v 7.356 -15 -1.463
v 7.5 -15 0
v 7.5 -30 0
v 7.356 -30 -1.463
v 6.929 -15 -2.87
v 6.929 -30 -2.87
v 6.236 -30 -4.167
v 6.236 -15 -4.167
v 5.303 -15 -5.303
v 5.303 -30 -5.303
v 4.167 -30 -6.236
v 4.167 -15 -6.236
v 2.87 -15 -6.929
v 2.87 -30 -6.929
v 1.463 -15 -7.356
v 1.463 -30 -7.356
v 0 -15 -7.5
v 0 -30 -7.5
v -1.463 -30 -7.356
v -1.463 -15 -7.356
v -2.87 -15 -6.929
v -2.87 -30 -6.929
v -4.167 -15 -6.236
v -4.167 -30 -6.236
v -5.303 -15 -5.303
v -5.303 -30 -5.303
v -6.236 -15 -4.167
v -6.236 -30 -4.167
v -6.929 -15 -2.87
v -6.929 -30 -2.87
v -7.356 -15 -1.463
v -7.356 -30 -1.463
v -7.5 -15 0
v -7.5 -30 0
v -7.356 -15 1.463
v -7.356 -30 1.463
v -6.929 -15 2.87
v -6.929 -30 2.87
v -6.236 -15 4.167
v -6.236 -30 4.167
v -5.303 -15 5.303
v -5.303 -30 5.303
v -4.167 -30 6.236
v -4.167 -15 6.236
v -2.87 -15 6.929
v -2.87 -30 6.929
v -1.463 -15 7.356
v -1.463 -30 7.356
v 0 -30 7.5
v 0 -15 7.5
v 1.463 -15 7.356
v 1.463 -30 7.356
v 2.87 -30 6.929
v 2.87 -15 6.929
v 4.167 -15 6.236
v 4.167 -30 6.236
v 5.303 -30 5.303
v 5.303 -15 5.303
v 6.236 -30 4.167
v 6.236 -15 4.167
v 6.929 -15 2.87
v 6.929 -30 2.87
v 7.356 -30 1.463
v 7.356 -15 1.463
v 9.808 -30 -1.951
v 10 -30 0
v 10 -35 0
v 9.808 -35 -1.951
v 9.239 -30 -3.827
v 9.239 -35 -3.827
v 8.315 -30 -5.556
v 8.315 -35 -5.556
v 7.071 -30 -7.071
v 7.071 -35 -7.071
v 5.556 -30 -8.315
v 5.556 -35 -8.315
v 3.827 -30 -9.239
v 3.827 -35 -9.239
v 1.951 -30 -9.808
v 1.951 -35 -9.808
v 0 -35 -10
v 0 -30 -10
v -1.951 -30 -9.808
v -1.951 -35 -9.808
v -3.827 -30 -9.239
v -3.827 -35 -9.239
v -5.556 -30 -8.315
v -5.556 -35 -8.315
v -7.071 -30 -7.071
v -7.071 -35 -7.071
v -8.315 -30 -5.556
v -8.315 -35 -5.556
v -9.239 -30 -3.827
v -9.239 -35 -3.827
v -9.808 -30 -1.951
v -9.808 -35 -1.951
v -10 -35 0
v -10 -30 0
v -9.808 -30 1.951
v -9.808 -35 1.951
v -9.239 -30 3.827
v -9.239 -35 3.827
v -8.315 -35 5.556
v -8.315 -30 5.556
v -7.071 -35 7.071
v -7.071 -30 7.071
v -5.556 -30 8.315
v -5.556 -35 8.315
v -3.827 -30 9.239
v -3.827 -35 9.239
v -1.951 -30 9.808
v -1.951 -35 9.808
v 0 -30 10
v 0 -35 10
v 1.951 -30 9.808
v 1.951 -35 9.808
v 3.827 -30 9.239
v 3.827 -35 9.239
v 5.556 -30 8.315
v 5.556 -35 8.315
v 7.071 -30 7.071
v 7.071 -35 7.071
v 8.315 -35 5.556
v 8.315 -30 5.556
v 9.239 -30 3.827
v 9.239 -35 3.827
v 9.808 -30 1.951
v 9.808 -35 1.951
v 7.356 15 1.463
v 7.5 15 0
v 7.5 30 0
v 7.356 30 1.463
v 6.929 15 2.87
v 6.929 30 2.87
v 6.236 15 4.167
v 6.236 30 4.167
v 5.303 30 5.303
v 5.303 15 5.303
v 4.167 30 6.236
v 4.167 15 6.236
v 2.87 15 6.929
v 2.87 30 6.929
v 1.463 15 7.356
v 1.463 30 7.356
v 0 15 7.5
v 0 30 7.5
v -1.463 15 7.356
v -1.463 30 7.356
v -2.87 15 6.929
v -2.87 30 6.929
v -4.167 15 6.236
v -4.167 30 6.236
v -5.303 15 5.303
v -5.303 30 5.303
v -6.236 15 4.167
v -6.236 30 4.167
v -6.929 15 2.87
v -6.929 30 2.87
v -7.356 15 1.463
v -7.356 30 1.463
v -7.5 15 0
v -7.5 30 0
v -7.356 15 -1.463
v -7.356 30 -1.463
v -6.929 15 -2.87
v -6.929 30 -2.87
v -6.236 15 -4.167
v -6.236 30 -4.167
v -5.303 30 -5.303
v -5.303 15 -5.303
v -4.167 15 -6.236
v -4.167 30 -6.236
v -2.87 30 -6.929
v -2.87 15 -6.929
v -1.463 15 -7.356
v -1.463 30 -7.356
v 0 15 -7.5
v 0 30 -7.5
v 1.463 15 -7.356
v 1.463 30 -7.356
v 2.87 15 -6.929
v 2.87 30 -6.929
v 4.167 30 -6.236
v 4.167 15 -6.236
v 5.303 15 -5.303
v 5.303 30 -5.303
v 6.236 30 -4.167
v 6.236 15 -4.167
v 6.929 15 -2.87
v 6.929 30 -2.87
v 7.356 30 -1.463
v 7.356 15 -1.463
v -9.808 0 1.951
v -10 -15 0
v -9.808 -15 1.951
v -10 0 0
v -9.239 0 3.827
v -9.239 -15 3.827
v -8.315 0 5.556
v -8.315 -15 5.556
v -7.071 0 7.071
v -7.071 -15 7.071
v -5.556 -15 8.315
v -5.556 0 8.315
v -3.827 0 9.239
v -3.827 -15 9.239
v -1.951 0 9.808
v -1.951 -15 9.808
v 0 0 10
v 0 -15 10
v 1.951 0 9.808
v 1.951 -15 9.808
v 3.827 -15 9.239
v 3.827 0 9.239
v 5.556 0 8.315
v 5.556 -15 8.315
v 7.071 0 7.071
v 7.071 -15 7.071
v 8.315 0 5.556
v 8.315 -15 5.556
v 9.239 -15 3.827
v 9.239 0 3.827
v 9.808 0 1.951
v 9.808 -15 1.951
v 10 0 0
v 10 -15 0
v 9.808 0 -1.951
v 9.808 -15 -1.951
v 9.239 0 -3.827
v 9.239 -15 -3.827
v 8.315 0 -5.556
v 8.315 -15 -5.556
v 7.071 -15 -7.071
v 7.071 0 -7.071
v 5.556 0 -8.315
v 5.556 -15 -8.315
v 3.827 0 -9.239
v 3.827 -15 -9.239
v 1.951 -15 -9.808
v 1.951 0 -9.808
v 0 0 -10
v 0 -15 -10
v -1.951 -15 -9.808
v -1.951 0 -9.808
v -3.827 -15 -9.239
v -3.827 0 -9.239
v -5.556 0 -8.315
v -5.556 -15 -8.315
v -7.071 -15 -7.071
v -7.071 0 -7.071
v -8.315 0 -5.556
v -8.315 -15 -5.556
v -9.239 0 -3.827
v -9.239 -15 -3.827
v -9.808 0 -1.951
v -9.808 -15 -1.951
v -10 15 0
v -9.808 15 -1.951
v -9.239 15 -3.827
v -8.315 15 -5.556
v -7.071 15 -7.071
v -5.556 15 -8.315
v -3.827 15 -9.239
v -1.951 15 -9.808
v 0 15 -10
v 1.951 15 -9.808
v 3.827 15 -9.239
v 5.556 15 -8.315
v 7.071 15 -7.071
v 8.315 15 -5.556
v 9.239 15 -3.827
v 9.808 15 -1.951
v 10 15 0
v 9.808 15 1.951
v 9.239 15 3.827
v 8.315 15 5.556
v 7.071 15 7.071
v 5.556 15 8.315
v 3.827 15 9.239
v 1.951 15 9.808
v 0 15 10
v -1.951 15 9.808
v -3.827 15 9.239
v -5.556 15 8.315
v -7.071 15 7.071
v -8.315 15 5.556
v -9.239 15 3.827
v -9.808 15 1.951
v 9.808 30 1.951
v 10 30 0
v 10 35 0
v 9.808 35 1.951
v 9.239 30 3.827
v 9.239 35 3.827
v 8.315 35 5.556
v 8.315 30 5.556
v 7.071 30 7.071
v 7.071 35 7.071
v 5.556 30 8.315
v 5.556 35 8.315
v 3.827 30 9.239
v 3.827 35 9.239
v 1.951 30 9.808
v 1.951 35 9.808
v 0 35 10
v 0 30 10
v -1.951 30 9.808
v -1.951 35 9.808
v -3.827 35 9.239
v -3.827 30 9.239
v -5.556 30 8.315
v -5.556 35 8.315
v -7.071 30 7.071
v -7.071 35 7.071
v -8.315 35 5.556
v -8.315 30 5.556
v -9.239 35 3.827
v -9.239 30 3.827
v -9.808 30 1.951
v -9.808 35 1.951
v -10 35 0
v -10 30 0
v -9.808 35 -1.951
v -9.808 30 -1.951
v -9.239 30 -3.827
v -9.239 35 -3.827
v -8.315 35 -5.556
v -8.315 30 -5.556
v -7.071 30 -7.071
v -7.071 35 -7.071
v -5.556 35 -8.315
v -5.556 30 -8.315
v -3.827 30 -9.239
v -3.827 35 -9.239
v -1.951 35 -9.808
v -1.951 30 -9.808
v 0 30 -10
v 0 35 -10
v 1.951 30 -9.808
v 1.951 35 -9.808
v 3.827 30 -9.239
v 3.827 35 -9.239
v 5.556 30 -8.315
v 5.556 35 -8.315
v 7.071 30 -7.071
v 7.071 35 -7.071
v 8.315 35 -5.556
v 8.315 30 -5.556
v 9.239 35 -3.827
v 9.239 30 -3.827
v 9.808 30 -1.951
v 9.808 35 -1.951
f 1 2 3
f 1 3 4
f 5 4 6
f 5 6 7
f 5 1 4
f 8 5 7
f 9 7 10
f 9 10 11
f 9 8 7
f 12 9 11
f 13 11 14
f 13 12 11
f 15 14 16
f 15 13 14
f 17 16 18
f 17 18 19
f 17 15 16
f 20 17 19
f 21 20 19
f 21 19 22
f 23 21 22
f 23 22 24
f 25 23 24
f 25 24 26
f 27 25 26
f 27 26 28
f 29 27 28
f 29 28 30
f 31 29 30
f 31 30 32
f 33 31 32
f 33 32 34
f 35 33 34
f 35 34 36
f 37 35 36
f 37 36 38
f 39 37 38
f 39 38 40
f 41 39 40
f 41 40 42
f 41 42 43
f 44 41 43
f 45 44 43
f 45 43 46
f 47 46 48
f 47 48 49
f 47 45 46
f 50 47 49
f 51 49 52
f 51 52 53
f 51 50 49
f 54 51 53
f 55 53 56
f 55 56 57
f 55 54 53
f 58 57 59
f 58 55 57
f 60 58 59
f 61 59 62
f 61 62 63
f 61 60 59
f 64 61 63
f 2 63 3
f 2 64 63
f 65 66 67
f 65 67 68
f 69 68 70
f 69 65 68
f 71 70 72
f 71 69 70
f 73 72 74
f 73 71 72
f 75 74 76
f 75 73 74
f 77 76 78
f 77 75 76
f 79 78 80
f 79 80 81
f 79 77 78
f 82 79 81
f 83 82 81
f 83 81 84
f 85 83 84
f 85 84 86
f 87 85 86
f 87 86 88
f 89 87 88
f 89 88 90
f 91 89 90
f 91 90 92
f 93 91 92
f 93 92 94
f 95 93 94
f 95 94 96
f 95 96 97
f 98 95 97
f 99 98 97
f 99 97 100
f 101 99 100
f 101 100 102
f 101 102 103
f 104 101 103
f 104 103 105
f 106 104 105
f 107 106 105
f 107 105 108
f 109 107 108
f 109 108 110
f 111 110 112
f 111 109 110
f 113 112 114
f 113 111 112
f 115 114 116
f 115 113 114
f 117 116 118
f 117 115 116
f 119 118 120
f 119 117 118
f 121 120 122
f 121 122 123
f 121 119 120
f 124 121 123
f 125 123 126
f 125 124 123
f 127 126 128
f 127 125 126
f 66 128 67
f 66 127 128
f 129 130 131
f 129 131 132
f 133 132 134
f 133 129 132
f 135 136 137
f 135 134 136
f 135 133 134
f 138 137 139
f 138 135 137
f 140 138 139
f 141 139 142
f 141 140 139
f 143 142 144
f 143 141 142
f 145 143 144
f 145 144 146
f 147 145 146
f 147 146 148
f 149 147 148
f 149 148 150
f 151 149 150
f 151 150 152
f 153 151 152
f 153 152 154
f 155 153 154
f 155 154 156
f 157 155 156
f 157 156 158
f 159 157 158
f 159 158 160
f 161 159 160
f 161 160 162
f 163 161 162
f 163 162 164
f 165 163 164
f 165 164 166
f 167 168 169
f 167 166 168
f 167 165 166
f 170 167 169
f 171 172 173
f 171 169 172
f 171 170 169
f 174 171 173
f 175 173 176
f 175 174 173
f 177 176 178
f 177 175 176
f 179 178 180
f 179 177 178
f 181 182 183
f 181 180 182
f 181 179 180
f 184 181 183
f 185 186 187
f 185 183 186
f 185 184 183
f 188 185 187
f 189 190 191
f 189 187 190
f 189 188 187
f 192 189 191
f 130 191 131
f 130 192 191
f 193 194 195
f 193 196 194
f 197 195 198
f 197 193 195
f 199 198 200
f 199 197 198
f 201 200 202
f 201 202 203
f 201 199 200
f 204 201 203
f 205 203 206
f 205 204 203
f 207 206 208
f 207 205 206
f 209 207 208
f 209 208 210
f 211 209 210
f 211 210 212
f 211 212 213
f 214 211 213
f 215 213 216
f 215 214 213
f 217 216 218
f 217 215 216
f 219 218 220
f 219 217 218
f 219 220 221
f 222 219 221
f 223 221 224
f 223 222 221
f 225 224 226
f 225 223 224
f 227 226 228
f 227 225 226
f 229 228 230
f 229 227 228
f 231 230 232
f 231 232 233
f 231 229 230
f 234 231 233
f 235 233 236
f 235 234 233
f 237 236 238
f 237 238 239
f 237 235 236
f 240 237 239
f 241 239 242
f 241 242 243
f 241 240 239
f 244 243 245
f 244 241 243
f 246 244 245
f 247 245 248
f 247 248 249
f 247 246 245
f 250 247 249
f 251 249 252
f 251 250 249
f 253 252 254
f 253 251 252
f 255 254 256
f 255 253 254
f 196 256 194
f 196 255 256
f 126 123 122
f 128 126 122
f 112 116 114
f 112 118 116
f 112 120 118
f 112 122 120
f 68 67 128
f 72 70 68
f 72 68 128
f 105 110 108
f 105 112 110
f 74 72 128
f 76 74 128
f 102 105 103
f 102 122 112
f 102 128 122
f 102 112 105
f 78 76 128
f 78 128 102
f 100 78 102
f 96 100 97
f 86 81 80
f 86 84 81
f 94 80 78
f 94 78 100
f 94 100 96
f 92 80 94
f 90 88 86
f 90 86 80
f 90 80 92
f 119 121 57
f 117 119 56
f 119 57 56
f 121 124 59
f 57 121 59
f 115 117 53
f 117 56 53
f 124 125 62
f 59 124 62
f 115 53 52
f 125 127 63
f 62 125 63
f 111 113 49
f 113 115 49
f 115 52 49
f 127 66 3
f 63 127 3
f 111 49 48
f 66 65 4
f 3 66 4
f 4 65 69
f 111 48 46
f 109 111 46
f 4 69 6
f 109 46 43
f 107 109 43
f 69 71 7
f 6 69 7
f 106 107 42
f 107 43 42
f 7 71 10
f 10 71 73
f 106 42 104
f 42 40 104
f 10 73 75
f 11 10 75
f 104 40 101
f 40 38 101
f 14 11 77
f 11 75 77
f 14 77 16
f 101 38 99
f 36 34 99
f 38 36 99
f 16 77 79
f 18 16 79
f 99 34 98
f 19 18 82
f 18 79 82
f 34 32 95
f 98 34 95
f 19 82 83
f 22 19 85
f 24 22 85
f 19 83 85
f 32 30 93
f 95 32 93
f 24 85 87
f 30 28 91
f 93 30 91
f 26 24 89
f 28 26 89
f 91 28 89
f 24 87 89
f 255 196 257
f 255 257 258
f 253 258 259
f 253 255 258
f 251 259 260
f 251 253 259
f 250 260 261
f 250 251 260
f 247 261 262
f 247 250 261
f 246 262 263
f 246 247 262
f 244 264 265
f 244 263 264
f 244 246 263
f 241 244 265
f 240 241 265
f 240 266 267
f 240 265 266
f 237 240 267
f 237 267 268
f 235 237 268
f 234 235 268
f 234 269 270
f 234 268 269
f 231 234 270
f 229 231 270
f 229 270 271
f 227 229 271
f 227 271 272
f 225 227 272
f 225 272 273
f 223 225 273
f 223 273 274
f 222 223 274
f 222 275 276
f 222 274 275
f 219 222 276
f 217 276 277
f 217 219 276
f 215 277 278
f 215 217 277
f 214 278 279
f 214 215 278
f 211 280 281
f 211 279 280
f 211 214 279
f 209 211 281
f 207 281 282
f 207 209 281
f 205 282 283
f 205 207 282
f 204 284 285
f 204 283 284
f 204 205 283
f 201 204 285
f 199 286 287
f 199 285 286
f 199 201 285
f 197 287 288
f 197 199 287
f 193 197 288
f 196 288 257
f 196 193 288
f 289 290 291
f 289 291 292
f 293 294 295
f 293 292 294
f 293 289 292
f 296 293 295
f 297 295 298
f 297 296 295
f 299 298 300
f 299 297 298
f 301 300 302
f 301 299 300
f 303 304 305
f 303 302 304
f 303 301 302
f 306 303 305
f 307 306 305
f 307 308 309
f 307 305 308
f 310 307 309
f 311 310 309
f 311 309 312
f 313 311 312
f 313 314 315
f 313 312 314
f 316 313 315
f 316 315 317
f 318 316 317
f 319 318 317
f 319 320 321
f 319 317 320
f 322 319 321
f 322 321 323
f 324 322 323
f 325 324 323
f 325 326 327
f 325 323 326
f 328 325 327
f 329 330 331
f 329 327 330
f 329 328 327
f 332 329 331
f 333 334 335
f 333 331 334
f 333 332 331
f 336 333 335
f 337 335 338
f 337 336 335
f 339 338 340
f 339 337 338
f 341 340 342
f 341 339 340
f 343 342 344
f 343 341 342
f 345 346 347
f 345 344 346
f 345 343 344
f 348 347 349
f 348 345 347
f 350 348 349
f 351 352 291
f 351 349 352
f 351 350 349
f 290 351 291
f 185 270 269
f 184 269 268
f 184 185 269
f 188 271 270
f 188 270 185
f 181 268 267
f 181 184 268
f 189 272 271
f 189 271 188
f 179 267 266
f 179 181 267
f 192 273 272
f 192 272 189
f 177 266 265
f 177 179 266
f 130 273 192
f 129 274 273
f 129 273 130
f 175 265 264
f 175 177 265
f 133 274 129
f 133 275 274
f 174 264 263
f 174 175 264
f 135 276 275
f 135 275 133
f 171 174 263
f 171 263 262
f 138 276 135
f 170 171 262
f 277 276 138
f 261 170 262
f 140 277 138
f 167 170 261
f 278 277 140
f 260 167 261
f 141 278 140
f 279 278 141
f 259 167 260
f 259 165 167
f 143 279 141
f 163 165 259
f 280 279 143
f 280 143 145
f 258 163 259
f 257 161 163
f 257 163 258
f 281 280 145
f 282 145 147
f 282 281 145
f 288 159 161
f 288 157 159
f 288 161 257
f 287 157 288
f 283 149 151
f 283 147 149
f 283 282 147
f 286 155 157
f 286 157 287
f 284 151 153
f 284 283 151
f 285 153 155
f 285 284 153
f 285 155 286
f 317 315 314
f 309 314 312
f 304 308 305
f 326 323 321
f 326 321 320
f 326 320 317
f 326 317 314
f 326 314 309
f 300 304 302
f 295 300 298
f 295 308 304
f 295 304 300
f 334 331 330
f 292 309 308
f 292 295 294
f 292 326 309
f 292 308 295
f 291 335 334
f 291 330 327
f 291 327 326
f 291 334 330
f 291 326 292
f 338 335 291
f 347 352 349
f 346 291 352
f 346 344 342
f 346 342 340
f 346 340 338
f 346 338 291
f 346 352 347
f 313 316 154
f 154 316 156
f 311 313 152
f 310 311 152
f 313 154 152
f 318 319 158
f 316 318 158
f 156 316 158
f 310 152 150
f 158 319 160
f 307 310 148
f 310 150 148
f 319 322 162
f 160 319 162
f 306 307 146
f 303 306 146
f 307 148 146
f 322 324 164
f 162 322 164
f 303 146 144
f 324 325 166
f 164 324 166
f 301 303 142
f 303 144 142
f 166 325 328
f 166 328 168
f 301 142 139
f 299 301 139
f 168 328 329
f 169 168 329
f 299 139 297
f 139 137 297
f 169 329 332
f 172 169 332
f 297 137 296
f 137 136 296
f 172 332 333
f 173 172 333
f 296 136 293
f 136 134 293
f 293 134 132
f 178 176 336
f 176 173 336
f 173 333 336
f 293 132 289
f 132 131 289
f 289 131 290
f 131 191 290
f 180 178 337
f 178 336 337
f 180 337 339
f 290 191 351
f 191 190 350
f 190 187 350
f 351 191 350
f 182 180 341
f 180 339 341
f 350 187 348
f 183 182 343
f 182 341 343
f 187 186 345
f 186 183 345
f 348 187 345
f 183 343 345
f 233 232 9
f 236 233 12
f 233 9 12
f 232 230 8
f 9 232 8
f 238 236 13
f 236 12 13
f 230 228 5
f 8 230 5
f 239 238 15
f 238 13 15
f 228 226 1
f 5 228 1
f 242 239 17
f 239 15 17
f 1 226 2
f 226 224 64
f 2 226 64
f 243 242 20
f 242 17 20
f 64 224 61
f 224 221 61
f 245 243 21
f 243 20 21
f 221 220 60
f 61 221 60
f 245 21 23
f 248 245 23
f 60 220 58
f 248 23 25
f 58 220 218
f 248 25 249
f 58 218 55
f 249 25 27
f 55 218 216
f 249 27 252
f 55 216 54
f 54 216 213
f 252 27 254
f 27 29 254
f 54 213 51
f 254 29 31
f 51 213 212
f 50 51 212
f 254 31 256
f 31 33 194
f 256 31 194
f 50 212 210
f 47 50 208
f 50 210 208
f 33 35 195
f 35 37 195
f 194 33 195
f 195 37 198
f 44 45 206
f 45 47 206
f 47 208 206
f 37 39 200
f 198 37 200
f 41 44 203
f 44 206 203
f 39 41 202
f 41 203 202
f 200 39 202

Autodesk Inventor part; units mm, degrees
ref_plane "YZ Plane" through (0, 0, 0) normal (1, 0, 0) x (0, 1, 0)
ref_plane "XZ Plane" through (0, 0, 0) normal (0, 1, 0) x (-1, 0, 0)
ref_plane "XY Plane" through (0, 0, 0) normal (0, 0, 1) x (1, 0, 0)
sketch "Szkic1" plane through (0, 0, 0) normal (0, 1, 0) x (-1, 0, 0)
  circle A0 centre (0, 0) radius 10
  dimension "d0" = 20
extrude "Wyciągnięcie proste1" add sketch "Szkic1" along normal mid plane 30
sketch "Szkic2" plane through (0, 15, 0) normal (0, 1, 0) x (1, 0, 0)
  circle A0 centre (0, 0) radius 10 projected
  circle A1 centre (0, 0) radius 7.5
  dimension "d3" = 15
extrude "Wyciągnięcie proste2" add sketch "Szkic2" along normal blind 15 contours A1
sketch "Szkic3" plane through (0, 30, 0) normal (0, 1, 0) x (1, 0, 0)
  circle A0 centre (0, 0) radius 7.5 projected
  circle A1 centre (0, 0) radius 10
  dimension "d6" = 20
extrude "Wyciągnięcie proste3" add sketch "Szkic3" along normal blind 5 contours A0 | A1
mirror "Odbicie lustrzane1" about plane through (0, 0, 0) normal (0, 1, 0) of "Wyciągnięcie proste3", "Wyciągnięcie proste2"
sketch "Szkic4" plane through (0, 0, 0) normal (1, 0, 0) x (0, 1, 0)
  point P0 (0, 0)
properties part number "RevolvingConnector1" material "Aluminium 6061"
